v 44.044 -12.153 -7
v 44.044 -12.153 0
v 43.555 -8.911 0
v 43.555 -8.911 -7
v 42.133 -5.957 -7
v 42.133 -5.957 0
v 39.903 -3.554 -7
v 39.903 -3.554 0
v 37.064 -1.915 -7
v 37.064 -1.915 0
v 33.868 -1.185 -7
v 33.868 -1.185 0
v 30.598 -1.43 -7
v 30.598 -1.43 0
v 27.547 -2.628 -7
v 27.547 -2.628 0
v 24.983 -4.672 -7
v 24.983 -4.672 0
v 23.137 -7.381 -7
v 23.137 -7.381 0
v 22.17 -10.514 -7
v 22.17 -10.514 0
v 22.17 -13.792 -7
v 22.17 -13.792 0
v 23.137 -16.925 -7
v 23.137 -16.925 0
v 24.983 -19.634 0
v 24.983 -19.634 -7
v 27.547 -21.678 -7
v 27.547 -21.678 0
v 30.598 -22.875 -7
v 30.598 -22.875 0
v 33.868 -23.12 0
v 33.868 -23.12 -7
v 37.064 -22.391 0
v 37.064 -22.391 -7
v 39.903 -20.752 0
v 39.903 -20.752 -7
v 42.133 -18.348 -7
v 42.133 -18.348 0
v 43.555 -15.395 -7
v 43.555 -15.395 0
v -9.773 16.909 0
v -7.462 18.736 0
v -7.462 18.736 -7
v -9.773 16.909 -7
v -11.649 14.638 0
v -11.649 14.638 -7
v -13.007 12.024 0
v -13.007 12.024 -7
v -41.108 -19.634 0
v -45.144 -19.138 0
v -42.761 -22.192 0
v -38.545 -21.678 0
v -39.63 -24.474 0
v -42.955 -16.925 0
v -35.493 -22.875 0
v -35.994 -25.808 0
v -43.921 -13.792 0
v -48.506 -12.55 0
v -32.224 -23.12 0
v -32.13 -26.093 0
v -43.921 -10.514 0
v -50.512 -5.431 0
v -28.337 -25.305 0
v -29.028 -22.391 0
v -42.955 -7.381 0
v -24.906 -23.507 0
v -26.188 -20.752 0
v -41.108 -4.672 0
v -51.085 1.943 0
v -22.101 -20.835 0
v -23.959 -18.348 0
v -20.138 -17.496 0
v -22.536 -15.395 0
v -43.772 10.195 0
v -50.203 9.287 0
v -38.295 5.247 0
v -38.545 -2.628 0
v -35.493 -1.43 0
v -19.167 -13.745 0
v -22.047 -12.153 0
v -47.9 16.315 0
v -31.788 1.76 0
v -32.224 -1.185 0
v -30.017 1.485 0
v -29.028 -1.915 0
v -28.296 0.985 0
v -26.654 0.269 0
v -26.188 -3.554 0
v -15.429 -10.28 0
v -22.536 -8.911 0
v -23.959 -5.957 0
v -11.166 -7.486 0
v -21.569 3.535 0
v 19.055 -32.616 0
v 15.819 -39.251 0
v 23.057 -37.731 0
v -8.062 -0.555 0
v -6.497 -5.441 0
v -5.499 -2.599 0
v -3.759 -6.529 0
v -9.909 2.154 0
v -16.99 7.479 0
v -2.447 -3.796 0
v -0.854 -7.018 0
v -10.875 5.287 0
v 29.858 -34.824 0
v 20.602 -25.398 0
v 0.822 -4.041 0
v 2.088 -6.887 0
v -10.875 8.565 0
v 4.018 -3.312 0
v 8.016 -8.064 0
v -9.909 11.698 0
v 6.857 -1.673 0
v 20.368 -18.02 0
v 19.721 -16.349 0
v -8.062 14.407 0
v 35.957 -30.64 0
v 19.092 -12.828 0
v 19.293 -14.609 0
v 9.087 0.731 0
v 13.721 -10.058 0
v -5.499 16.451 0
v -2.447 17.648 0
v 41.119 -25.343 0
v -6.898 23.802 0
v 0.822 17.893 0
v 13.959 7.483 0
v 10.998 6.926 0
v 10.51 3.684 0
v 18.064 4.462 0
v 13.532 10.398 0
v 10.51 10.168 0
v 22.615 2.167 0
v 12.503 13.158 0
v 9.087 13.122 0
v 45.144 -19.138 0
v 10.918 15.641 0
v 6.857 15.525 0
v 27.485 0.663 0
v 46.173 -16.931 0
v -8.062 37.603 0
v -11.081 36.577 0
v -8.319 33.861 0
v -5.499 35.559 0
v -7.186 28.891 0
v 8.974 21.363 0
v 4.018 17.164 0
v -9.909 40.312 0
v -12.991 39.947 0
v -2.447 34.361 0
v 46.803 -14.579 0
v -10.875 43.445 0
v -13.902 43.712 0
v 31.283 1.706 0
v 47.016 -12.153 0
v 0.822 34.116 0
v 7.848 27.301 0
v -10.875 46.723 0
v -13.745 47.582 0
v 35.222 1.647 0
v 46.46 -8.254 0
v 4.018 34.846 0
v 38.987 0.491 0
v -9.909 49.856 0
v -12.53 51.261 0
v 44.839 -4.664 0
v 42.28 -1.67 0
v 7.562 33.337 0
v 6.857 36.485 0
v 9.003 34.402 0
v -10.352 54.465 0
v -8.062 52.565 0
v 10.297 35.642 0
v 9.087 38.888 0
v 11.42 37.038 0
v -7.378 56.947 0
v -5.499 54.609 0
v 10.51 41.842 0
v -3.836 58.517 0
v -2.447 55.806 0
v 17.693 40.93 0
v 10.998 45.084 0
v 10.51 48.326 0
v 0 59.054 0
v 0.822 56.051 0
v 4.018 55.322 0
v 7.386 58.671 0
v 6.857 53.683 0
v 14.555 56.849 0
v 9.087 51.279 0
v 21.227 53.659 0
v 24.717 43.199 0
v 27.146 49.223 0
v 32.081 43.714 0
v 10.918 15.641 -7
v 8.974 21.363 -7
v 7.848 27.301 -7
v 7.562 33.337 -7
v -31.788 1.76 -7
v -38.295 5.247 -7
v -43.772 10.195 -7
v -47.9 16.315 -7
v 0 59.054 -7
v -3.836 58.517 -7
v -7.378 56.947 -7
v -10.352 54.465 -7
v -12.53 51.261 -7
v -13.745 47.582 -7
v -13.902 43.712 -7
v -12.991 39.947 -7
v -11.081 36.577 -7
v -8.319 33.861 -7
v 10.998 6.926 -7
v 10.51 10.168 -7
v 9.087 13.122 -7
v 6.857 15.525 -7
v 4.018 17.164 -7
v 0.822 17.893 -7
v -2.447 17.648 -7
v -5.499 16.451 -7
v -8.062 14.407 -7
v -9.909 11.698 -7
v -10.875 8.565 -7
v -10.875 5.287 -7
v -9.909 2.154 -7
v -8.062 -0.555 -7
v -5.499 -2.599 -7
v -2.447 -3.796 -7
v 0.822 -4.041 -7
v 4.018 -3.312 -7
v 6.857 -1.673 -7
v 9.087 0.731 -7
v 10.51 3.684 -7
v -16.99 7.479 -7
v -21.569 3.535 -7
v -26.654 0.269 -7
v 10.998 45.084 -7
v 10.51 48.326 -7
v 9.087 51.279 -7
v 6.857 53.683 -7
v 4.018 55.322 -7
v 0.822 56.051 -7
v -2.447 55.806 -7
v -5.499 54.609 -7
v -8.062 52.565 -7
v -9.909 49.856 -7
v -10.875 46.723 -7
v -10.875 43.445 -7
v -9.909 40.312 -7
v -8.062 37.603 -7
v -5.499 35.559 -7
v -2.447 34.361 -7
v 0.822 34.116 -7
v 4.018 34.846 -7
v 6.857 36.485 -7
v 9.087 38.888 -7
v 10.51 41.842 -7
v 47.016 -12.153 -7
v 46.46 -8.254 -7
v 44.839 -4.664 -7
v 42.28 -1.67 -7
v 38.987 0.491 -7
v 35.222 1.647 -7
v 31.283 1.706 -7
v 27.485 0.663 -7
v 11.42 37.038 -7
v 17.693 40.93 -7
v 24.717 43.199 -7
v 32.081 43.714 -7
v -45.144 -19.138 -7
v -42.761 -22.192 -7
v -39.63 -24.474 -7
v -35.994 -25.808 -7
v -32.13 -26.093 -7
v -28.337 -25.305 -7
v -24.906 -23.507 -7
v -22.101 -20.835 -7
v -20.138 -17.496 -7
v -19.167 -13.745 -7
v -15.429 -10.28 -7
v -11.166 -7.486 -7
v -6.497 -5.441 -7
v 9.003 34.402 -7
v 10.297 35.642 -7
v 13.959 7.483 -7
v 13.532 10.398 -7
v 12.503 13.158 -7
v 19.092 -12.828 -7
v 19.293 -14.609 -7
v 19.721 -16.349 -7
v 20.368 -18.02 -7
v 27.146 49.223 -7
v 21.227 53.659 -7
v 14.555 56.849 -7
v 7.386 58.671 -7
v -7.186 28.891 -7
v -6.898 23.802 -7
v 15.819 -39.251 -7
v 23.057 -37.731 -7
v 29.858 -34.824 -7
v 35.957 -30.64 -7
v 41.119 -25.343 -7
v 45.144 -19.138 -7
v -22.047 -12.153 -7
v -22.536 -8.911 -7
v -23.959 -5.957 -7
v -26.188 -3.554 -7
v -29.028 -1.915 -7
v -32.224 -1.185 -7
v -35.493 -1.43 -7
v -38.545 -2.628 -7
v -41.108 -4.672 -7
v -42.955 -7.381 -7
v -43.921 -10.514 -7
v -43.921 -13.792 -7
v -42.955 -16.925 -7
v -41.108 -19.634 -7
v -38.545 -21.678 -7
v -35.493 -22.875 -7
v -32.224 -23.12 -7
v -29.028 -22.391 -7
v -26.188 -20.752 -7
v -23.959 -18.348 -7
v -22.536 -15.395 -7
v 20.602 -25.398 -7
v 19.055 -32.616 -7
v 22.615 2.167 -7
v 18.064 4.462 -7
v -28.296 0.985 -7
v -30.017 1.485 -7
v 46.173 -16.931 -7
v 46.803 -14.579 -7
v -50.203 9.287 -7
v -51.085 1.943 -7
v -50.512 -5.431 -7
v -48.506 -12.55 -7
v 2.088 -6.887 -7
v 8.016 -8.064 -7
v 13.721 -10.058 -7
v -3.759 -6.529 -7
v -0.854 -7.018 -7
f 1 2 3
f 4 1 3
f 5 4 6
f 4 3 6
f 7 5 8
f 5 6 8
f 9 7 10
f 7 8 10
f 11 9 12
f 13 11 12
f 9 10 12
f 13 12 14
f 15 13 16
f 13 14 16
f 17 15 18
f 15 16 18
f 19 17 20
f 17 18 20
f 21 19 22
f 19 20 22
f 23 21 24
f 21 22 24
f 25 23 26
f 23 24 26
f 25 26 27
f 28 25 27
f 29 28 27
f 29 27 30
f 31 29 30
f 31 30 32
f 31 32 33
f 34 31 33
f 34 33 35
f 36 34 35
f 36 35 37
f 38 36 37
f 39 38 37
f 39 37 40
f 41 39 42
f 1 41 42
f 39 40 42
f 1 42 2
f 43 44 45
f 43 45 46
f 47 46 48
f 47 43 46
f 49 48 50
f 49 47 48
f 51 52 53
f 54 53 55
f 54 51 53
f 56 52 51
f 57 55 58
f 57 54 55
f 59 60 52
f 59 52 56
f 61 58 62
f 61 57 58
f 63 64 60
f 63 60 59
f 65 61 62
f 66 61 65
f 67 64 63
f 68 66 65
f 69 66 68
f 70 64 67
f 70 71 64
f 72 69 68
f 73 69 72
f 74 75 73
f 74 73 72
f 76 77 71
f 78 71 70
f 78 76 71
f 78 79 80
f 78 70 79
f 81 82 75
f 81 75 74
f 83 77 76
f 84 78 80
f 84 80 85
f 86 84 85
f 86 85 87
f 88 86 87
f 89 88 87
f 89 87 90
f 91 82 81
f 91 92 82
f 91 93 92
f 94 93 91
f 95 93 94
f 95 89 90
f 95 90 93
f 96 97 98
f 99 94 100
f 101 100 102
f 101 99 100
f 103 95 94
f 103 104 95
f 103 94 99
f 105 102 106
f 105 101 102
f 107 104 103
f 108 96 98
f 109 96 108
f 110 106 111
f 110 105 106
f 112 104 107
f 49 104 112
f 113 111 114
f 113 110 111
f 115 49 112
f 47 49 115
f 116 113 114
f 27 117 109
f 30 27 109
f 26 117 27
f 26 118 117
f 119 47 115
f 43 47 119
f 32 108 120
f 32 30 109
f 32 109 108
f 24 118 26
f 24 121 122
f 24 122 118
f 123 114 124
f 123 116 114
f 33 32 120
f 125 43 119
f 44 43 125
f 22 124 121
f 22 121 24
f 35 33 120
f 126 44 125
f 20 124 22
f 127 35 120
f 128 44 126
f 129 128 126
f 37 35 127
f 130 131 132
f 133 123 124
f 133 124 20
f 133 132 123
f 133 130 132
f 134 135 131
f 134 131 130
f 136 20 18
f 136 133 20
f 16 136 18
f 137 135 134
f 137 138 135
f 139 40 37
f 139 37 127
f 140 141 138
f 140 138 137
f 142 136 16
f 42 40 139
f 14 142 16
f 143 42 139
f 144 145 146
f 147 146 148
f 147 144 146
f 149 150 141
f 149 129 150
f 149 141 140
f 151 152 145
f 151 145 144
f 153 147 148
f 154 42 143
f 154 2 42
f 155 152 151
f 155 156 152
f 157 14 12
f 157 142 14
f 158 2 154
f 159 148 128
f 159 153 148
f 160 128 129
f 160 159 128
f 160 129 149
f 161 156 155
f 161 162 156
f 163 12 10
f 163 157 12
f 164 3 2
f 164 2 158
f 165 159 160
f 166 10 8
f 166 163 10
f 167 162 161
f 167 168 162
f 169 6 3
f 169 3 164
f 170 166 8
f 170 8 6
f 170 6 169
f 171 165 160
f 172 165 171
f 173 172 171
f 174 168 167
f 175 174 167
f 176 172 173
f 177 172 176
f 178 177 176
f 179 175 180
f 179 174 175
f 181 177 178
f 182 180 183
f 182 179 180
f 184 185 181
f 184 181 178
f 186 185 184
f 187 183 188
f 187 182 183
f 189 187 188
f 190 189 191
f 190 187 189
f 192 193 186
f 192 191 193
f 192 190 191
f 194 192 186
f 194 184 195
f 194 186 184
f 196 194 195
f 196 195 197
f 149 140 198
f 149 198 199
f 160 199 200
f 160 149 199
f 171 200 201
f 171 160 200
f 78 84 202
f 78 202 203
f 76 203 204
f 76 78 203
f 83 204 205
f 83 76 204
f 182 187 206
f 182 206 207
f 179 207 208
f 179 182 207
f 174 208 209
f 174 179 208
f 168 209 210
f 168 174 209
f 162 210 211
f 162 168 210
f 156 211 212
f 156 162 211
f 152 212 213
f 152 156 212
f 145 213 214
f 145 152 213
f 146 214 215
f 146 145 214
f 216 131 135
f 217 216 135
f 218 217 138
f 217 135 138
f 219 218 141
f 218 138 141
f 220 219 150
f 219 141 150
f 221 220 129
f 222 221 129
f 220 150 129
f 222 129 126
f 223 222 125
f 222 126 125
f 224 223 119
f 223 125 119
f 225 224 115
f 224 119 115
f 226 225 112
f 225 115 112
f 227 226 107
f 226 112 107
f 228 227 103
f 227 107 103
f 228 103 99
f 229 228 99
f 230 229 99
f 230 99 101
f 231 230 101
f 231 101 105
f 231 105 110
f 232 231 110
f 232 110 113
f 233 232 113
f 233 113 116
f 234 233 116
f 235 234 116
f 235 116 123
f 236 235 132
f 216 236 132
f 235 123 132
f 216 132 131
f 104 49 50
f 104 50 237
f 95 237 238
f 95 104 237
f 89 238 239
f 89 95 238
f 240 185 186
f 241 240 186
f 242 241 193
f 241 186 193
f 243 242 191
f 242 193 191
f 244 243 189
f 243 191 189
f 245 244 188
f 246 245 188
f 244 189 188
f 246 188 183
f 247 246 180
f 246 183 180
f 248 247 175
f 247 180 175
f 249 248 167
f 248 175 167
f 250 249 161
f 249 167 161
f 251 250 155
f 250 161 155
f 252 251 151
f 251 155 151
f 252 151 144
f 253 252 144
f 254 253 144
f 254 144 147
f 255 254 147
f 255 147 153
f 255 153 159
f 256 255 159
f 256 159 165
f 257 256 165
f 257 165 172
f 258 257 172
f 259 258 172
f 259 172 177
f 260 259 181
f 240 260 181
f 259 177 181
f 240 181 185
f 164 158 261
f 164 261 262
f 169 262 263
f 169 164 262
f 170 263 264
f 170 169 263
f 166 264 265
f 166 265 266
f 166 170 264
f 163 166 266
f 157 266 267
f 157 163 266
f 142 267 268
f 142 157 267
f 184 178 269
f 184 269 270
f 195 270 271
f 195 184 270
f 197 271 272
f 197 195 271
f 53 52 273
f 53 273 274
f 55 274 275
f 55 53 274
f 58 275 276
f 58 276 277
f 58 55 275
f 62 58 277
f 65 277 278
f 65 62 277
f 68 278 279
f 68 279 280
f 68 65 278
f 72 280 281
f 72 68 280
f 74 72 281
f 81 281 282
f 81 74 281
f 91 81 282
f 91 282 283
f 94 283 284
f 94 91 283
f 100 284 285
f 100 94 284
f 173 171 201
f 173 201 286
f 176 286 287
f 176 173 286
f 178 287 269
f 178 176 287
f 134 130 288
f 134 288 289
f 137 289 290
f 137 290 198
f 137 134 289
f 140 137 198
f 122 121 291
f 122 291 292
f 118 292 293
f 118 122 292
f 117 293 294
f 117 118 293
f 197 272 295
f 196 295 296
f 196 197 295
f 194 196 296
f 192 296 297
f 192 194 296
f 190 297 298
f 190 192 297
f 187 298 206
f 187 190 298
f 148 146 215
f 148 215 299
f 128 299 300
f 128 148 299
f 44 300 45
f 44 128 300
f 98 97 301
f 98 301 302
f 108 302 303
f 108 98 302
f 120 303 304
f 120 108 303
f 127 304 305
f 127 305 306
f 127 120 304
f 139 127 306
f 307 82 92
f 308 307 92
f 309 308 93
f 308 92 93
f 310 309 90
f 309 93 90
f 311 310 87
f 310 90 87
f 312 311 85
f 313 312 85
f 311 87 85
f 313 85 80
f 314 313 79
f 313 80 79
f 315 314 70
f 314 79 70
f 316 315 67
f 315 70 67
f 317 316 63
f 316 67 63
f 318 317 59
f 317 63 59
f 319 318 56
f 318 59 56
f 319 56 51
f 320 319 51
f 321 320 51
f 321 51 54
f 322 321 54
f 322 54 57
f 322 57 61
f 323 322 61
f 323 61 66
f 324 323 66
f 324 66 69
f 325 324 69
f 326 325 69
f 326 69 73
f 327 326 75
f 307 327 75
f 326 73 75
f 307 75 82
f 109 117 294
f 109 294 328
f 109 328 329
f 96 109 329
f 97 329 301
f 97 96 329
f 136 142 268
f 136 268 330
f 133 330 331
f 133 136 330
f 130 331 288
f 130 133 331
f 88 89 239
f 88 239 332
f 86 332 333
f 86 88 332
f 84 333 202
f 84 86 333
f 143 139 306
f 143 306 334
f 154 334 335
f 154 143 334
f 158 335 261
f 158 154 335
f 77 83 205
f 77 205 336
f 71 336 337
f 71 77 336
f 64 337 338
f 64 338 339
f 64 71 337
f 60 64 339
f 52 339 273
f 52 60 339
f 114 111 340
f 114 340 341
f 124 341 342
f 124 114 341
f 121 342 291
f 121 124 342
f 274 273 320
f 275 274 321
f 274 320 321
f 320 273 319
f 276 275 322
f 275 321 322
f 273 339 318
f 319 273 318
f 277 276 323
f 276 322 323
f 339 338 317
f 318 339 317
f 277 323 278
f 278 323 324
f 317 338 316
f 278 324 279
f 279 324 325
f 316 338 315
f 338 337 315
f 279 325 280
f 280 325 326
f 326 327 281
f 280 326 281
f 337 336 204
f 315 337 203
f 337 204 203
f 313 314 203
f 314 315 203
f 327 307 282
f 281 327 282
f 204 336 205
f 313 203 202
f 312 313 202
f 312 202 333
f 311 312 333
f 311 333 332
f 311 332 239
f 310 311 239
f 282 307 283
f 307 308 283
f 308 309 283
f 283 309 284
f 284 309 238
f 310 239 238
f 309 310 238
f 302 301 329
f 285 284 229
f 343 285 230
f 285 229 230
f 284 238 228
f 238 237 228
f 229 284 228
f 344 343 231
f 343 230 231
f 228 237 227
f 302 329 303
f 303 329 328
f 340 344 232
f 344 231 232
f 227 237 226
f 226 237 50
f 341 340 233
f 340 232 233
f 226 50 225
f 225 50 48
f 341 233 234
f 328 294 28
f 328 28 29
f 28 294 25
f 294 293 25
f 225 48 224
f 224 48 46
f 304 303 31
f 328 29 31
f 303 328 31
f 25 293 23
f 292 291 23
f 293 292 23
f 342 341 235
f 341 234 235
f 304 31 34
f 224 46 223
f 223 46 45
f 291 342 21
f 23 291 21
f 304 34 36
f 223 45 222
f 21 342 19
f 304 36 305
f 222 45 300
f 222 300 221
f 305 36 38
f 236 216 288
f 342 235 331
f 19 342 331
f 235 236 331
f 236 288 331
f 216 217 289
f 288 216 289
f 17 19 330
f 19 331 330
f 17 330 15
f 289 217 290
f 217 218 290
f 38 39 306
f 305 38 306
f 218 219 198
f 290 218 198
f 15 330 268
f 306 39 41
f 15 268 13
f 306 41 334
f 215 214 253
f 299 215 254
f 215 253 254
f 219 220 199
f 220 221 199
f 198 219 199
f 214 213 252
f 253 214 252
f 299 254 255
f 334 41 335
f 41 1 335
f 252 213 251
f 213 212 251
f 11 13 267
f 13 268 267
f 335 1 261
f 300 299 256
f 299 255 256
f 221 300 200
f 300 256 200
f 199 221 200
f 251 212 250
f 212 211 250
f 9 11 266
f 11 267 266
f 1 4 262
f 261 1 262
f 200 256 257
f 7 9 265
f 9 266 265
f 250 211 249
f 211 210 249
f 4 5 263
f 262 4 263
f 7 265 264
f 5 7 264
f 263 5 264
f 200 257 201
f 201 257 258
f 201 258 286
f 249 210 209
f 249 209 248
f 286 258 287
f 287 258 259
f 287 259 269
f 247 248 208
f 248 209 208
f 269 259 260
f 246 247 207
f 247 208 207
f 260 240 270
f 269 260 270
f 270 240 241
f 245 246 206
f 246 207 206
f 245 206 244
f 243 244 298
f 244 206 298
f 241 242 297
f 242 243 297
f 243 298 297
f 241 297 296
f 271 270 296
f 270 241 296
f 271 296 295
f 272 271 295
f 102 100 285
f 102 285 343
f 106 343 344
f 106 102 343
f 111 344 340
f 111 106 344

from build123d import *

# Parameters (mm, degrees)
F0_R     = 10.9982
F1_DEPTH = 7.000011


with BuildPart() as f1:
    # F0 (on Top) → F1 (new body)
    with BuildSketch(Plane.XY):
        with BuildLine():
            ThreePointArc((2.088246, -6.887012), (10.590885, -2.184077), (13.97, 6.92603))
            ThreePointArc((13.97, 6.92603), (13.967218, 7.204808), (13.958874, 7.483476))
            ThreePointArc((13.958874, 7.483476), (13.090268, 11.805146), (10.918322, 15.641025))
            ThreePointArc((10.918322, 15.641025), (2.319695, 20.702093), (-7.462199, 18.736046))
            ThreePointArc((-7.462199, 18.736046), (-10.770573, 15.822976), (-13.006568, 12.024077))
            ThreePointArc((-13.006568, 12.024077), (-13.090268, 2.046913), (-6.496674, -5.441432))
            ThreePointArc((-6.496674, -5.441432), (-2.319695, -6.850033), (2.088246, -6.887012))
        make_face()
        with Locations((0, 6.92603)):
            Circle(F0_R, mode=Mode.SUBTRACT)
        with BuildLine():
            ThreePointArc((13.958874, 7.483476), (13.967218, 7.204808), (13.97, 6.92603))
            ThreePointArc((13.97, 6.92603), (10.590885, -2.184077), (2.088246, -6.887012))
            ThreePointArc((2.088246, -6.887012), (10.903349, -8.961172), (19.09199, -12.828255))
            ThreePointArc((19.09199, -12.828255), (21.183867, -4.773264), (27.485263, 0.662841))
            ThreePointArc((27.485263, 0.662841), (20.291579, 3.219431), (13.958874, 7.483476))
        make_face()
        with BuildLine():
            ThreePointArc((-7.462199, 18.736046), (2.319695, 20.702093), (10.918322, 15.641025))
            ThreePointArc((10.918322, 15.641025), (8.307046, 24.312208), (7.561717, 33.337321))
            ThreePointArc((7.561717, 33.337321), (-0.460048, 31.121444), (-8.318551, 33.86056))
            ThreePointArc((-8.318551, 33.86056), (-6.935781, 26.352352), (-7.462199, 18.736046))
        make_face()
        with BuildLine():
            ThreePointArc((47.015656, -12.152889), (40.70993, -0.473), (27.485263, 0.662841))
            ThreePointArc((27.485263, 0.662841), (21.183867, -4.773264), (19.09199, -12.828255))
            ThreePointArc((19.09199, -12.828255), (19.843858, -15.396303), (20.367595, -18.020398))
            ThreePointArc((20.367595, -18.020398), (32.416208, -26.108701), (45.144031, -19.137889))
            ThreePointArc((45.144031, -19.137889), (46.53964, -15.768591), (47.015656, -12.152889))
        make_face()
        with Locations((33.045656, -12.152889)):
            Circle(F0_R, mode=Mode.SUBTRACT)
        with BuildLine():
            ThreePointArc((-19.166712, -13.745312), (-13.355798, -8.793694), (-6.496674, -5.441432))
            ThreePointArc((-6.496674, -5.441432), (-13.090268, 2.046913), (-13.006568, 12.024077))
            ThreePointArc((-13.006568, 12.024077), (-19.210395, 5.427054), (-26.653708, 0.269023))
            ThreePointArc((-26.653708, 0.269023), (-21.119709, -4.877403), (-19.075656, -12.152889))
            ThreePointArc((-19.075656, -12.152889), (-19.098439, -12.950401), (-19.166712, -13.745312))
        make_face()
        with BuildLine():
            ThreePointArc((20.367595, -18.020398), (19.843858, -15.396303), (19.09199, -12.828255))
            ThreePointArc((19.09199, -12.828255), (19.479087, -15.48592), (20.367595, -18.020398))
        make_face()
        with BuildLine():
            ThreePointArc((11.420443, 37.038098), (9.409778, 35.272481), (7.561717, 33.337321))
            ThreePointArc((7.561717, 33.337321), (9.669774, 35.001389), (11.420443, 37.038098))
        make_face()
        with BuildLine():
            ThreePointArc((-8.318551, 33.86056), (-0.460048, 31.121444), (7.561717, 33.337321))
            ThreePointArc((7.561717, 33.337321), (9.409778, 35.272481), (11.420443, 37.038098))
            ThreePointArc((11.420443, 37.038098), (13.317366, 40.863836), (13.97, 45.083867))
            ThreePointArc((13.97, 45.083867), (9.878282, 54.962148), (0, 59.053867))
            ThreePointArc((0, 59.053867), (-13.265566, 49.46401), (-8.318551, 33.86056))
        make_face()
        with Locations((0, 45.083867)):
            Circle(F0_R, mode=Mode.SUBTRACT)
        with BuildLine():
            ThreePointArc((-45.144031, -19.137889), (-30.206188, -25.831277), (-19.166712, -13.745312))
            ThreePointArc((-19.166712, -13.745312), (-19.098439, -12.950401), (-19.075656, -12.152889))
            ThreePointArc((-19.075656, -12.152889), (-21.119709, -4.877403), (-26.653708, 0.269023))
            ThreePointArc((-26.653708, 0.269023), (-29.253636, 0.901911), (-31.788038, 1.760389))
            ThreePointArc((-31.788038, 1.760389), (-44.81702, -4.629864), (-45.144031, -19.137889))
        make_face()
        with Locations((-33.045656, -12.152889)):
            Circle(F0_R, mode=Mode.SUBTRACT)
        with BuildLine():
            ThreePointArc((45.144031, -19.137889), (32.416208, -26.108701), (20.367595, -18.020398))
            ThreePointArc((20.367595, -18.020398), (20.047579, -29.054393), (15.81854, -39.250799))
            ThreePointArc((15.81854, -39.250799), (33.010768, -32.882439), (45.144031, -19.137889))
        make_face()
        with BuildLine():
            ThreePointArc((13.97, 45.083867), (13.317366, 40.863836), (11.420443, 37.038098))
            ThreePointArc((11.420443, 37.038098), (21.136171, 42.277954), (32.081037, 43.713701))
            ThreePointArc((32.081037, 43.713701), (17.969761, 55.418428), (0, 59.053867))
            ThreePointArc((0, 59.053867), (9.878282, 54.962148), (13.97, 45.083867))
        make_face()
        with BuildLine():
            ThreePointArc((-31.788038, 1.760389), (-29.253636, 0.901911), (-26.653708, 0.269023))
            ThreePointArc((-26.653708, 0.269023), (-29.148861, 1.262621), (-31.788038, 1.760389))
        make_face()
        with BuildLine():
            ThreePointArc((-47.899577, 16.315187), (-50.980529, -1.7579), (-45.144031, -19.137889))
            ThreePointArc((-45.144031, -19.137889), (-44.81702, -4.629864), (-31.788038, 1.760389))
            ThreePointArc((-31.788038, 1.760389), (-41.18375, 7.554529), (-47.899577, 16.315187))
        make_face()
    extrude(amount=-F1_DEPTH)


solid = f1.part
